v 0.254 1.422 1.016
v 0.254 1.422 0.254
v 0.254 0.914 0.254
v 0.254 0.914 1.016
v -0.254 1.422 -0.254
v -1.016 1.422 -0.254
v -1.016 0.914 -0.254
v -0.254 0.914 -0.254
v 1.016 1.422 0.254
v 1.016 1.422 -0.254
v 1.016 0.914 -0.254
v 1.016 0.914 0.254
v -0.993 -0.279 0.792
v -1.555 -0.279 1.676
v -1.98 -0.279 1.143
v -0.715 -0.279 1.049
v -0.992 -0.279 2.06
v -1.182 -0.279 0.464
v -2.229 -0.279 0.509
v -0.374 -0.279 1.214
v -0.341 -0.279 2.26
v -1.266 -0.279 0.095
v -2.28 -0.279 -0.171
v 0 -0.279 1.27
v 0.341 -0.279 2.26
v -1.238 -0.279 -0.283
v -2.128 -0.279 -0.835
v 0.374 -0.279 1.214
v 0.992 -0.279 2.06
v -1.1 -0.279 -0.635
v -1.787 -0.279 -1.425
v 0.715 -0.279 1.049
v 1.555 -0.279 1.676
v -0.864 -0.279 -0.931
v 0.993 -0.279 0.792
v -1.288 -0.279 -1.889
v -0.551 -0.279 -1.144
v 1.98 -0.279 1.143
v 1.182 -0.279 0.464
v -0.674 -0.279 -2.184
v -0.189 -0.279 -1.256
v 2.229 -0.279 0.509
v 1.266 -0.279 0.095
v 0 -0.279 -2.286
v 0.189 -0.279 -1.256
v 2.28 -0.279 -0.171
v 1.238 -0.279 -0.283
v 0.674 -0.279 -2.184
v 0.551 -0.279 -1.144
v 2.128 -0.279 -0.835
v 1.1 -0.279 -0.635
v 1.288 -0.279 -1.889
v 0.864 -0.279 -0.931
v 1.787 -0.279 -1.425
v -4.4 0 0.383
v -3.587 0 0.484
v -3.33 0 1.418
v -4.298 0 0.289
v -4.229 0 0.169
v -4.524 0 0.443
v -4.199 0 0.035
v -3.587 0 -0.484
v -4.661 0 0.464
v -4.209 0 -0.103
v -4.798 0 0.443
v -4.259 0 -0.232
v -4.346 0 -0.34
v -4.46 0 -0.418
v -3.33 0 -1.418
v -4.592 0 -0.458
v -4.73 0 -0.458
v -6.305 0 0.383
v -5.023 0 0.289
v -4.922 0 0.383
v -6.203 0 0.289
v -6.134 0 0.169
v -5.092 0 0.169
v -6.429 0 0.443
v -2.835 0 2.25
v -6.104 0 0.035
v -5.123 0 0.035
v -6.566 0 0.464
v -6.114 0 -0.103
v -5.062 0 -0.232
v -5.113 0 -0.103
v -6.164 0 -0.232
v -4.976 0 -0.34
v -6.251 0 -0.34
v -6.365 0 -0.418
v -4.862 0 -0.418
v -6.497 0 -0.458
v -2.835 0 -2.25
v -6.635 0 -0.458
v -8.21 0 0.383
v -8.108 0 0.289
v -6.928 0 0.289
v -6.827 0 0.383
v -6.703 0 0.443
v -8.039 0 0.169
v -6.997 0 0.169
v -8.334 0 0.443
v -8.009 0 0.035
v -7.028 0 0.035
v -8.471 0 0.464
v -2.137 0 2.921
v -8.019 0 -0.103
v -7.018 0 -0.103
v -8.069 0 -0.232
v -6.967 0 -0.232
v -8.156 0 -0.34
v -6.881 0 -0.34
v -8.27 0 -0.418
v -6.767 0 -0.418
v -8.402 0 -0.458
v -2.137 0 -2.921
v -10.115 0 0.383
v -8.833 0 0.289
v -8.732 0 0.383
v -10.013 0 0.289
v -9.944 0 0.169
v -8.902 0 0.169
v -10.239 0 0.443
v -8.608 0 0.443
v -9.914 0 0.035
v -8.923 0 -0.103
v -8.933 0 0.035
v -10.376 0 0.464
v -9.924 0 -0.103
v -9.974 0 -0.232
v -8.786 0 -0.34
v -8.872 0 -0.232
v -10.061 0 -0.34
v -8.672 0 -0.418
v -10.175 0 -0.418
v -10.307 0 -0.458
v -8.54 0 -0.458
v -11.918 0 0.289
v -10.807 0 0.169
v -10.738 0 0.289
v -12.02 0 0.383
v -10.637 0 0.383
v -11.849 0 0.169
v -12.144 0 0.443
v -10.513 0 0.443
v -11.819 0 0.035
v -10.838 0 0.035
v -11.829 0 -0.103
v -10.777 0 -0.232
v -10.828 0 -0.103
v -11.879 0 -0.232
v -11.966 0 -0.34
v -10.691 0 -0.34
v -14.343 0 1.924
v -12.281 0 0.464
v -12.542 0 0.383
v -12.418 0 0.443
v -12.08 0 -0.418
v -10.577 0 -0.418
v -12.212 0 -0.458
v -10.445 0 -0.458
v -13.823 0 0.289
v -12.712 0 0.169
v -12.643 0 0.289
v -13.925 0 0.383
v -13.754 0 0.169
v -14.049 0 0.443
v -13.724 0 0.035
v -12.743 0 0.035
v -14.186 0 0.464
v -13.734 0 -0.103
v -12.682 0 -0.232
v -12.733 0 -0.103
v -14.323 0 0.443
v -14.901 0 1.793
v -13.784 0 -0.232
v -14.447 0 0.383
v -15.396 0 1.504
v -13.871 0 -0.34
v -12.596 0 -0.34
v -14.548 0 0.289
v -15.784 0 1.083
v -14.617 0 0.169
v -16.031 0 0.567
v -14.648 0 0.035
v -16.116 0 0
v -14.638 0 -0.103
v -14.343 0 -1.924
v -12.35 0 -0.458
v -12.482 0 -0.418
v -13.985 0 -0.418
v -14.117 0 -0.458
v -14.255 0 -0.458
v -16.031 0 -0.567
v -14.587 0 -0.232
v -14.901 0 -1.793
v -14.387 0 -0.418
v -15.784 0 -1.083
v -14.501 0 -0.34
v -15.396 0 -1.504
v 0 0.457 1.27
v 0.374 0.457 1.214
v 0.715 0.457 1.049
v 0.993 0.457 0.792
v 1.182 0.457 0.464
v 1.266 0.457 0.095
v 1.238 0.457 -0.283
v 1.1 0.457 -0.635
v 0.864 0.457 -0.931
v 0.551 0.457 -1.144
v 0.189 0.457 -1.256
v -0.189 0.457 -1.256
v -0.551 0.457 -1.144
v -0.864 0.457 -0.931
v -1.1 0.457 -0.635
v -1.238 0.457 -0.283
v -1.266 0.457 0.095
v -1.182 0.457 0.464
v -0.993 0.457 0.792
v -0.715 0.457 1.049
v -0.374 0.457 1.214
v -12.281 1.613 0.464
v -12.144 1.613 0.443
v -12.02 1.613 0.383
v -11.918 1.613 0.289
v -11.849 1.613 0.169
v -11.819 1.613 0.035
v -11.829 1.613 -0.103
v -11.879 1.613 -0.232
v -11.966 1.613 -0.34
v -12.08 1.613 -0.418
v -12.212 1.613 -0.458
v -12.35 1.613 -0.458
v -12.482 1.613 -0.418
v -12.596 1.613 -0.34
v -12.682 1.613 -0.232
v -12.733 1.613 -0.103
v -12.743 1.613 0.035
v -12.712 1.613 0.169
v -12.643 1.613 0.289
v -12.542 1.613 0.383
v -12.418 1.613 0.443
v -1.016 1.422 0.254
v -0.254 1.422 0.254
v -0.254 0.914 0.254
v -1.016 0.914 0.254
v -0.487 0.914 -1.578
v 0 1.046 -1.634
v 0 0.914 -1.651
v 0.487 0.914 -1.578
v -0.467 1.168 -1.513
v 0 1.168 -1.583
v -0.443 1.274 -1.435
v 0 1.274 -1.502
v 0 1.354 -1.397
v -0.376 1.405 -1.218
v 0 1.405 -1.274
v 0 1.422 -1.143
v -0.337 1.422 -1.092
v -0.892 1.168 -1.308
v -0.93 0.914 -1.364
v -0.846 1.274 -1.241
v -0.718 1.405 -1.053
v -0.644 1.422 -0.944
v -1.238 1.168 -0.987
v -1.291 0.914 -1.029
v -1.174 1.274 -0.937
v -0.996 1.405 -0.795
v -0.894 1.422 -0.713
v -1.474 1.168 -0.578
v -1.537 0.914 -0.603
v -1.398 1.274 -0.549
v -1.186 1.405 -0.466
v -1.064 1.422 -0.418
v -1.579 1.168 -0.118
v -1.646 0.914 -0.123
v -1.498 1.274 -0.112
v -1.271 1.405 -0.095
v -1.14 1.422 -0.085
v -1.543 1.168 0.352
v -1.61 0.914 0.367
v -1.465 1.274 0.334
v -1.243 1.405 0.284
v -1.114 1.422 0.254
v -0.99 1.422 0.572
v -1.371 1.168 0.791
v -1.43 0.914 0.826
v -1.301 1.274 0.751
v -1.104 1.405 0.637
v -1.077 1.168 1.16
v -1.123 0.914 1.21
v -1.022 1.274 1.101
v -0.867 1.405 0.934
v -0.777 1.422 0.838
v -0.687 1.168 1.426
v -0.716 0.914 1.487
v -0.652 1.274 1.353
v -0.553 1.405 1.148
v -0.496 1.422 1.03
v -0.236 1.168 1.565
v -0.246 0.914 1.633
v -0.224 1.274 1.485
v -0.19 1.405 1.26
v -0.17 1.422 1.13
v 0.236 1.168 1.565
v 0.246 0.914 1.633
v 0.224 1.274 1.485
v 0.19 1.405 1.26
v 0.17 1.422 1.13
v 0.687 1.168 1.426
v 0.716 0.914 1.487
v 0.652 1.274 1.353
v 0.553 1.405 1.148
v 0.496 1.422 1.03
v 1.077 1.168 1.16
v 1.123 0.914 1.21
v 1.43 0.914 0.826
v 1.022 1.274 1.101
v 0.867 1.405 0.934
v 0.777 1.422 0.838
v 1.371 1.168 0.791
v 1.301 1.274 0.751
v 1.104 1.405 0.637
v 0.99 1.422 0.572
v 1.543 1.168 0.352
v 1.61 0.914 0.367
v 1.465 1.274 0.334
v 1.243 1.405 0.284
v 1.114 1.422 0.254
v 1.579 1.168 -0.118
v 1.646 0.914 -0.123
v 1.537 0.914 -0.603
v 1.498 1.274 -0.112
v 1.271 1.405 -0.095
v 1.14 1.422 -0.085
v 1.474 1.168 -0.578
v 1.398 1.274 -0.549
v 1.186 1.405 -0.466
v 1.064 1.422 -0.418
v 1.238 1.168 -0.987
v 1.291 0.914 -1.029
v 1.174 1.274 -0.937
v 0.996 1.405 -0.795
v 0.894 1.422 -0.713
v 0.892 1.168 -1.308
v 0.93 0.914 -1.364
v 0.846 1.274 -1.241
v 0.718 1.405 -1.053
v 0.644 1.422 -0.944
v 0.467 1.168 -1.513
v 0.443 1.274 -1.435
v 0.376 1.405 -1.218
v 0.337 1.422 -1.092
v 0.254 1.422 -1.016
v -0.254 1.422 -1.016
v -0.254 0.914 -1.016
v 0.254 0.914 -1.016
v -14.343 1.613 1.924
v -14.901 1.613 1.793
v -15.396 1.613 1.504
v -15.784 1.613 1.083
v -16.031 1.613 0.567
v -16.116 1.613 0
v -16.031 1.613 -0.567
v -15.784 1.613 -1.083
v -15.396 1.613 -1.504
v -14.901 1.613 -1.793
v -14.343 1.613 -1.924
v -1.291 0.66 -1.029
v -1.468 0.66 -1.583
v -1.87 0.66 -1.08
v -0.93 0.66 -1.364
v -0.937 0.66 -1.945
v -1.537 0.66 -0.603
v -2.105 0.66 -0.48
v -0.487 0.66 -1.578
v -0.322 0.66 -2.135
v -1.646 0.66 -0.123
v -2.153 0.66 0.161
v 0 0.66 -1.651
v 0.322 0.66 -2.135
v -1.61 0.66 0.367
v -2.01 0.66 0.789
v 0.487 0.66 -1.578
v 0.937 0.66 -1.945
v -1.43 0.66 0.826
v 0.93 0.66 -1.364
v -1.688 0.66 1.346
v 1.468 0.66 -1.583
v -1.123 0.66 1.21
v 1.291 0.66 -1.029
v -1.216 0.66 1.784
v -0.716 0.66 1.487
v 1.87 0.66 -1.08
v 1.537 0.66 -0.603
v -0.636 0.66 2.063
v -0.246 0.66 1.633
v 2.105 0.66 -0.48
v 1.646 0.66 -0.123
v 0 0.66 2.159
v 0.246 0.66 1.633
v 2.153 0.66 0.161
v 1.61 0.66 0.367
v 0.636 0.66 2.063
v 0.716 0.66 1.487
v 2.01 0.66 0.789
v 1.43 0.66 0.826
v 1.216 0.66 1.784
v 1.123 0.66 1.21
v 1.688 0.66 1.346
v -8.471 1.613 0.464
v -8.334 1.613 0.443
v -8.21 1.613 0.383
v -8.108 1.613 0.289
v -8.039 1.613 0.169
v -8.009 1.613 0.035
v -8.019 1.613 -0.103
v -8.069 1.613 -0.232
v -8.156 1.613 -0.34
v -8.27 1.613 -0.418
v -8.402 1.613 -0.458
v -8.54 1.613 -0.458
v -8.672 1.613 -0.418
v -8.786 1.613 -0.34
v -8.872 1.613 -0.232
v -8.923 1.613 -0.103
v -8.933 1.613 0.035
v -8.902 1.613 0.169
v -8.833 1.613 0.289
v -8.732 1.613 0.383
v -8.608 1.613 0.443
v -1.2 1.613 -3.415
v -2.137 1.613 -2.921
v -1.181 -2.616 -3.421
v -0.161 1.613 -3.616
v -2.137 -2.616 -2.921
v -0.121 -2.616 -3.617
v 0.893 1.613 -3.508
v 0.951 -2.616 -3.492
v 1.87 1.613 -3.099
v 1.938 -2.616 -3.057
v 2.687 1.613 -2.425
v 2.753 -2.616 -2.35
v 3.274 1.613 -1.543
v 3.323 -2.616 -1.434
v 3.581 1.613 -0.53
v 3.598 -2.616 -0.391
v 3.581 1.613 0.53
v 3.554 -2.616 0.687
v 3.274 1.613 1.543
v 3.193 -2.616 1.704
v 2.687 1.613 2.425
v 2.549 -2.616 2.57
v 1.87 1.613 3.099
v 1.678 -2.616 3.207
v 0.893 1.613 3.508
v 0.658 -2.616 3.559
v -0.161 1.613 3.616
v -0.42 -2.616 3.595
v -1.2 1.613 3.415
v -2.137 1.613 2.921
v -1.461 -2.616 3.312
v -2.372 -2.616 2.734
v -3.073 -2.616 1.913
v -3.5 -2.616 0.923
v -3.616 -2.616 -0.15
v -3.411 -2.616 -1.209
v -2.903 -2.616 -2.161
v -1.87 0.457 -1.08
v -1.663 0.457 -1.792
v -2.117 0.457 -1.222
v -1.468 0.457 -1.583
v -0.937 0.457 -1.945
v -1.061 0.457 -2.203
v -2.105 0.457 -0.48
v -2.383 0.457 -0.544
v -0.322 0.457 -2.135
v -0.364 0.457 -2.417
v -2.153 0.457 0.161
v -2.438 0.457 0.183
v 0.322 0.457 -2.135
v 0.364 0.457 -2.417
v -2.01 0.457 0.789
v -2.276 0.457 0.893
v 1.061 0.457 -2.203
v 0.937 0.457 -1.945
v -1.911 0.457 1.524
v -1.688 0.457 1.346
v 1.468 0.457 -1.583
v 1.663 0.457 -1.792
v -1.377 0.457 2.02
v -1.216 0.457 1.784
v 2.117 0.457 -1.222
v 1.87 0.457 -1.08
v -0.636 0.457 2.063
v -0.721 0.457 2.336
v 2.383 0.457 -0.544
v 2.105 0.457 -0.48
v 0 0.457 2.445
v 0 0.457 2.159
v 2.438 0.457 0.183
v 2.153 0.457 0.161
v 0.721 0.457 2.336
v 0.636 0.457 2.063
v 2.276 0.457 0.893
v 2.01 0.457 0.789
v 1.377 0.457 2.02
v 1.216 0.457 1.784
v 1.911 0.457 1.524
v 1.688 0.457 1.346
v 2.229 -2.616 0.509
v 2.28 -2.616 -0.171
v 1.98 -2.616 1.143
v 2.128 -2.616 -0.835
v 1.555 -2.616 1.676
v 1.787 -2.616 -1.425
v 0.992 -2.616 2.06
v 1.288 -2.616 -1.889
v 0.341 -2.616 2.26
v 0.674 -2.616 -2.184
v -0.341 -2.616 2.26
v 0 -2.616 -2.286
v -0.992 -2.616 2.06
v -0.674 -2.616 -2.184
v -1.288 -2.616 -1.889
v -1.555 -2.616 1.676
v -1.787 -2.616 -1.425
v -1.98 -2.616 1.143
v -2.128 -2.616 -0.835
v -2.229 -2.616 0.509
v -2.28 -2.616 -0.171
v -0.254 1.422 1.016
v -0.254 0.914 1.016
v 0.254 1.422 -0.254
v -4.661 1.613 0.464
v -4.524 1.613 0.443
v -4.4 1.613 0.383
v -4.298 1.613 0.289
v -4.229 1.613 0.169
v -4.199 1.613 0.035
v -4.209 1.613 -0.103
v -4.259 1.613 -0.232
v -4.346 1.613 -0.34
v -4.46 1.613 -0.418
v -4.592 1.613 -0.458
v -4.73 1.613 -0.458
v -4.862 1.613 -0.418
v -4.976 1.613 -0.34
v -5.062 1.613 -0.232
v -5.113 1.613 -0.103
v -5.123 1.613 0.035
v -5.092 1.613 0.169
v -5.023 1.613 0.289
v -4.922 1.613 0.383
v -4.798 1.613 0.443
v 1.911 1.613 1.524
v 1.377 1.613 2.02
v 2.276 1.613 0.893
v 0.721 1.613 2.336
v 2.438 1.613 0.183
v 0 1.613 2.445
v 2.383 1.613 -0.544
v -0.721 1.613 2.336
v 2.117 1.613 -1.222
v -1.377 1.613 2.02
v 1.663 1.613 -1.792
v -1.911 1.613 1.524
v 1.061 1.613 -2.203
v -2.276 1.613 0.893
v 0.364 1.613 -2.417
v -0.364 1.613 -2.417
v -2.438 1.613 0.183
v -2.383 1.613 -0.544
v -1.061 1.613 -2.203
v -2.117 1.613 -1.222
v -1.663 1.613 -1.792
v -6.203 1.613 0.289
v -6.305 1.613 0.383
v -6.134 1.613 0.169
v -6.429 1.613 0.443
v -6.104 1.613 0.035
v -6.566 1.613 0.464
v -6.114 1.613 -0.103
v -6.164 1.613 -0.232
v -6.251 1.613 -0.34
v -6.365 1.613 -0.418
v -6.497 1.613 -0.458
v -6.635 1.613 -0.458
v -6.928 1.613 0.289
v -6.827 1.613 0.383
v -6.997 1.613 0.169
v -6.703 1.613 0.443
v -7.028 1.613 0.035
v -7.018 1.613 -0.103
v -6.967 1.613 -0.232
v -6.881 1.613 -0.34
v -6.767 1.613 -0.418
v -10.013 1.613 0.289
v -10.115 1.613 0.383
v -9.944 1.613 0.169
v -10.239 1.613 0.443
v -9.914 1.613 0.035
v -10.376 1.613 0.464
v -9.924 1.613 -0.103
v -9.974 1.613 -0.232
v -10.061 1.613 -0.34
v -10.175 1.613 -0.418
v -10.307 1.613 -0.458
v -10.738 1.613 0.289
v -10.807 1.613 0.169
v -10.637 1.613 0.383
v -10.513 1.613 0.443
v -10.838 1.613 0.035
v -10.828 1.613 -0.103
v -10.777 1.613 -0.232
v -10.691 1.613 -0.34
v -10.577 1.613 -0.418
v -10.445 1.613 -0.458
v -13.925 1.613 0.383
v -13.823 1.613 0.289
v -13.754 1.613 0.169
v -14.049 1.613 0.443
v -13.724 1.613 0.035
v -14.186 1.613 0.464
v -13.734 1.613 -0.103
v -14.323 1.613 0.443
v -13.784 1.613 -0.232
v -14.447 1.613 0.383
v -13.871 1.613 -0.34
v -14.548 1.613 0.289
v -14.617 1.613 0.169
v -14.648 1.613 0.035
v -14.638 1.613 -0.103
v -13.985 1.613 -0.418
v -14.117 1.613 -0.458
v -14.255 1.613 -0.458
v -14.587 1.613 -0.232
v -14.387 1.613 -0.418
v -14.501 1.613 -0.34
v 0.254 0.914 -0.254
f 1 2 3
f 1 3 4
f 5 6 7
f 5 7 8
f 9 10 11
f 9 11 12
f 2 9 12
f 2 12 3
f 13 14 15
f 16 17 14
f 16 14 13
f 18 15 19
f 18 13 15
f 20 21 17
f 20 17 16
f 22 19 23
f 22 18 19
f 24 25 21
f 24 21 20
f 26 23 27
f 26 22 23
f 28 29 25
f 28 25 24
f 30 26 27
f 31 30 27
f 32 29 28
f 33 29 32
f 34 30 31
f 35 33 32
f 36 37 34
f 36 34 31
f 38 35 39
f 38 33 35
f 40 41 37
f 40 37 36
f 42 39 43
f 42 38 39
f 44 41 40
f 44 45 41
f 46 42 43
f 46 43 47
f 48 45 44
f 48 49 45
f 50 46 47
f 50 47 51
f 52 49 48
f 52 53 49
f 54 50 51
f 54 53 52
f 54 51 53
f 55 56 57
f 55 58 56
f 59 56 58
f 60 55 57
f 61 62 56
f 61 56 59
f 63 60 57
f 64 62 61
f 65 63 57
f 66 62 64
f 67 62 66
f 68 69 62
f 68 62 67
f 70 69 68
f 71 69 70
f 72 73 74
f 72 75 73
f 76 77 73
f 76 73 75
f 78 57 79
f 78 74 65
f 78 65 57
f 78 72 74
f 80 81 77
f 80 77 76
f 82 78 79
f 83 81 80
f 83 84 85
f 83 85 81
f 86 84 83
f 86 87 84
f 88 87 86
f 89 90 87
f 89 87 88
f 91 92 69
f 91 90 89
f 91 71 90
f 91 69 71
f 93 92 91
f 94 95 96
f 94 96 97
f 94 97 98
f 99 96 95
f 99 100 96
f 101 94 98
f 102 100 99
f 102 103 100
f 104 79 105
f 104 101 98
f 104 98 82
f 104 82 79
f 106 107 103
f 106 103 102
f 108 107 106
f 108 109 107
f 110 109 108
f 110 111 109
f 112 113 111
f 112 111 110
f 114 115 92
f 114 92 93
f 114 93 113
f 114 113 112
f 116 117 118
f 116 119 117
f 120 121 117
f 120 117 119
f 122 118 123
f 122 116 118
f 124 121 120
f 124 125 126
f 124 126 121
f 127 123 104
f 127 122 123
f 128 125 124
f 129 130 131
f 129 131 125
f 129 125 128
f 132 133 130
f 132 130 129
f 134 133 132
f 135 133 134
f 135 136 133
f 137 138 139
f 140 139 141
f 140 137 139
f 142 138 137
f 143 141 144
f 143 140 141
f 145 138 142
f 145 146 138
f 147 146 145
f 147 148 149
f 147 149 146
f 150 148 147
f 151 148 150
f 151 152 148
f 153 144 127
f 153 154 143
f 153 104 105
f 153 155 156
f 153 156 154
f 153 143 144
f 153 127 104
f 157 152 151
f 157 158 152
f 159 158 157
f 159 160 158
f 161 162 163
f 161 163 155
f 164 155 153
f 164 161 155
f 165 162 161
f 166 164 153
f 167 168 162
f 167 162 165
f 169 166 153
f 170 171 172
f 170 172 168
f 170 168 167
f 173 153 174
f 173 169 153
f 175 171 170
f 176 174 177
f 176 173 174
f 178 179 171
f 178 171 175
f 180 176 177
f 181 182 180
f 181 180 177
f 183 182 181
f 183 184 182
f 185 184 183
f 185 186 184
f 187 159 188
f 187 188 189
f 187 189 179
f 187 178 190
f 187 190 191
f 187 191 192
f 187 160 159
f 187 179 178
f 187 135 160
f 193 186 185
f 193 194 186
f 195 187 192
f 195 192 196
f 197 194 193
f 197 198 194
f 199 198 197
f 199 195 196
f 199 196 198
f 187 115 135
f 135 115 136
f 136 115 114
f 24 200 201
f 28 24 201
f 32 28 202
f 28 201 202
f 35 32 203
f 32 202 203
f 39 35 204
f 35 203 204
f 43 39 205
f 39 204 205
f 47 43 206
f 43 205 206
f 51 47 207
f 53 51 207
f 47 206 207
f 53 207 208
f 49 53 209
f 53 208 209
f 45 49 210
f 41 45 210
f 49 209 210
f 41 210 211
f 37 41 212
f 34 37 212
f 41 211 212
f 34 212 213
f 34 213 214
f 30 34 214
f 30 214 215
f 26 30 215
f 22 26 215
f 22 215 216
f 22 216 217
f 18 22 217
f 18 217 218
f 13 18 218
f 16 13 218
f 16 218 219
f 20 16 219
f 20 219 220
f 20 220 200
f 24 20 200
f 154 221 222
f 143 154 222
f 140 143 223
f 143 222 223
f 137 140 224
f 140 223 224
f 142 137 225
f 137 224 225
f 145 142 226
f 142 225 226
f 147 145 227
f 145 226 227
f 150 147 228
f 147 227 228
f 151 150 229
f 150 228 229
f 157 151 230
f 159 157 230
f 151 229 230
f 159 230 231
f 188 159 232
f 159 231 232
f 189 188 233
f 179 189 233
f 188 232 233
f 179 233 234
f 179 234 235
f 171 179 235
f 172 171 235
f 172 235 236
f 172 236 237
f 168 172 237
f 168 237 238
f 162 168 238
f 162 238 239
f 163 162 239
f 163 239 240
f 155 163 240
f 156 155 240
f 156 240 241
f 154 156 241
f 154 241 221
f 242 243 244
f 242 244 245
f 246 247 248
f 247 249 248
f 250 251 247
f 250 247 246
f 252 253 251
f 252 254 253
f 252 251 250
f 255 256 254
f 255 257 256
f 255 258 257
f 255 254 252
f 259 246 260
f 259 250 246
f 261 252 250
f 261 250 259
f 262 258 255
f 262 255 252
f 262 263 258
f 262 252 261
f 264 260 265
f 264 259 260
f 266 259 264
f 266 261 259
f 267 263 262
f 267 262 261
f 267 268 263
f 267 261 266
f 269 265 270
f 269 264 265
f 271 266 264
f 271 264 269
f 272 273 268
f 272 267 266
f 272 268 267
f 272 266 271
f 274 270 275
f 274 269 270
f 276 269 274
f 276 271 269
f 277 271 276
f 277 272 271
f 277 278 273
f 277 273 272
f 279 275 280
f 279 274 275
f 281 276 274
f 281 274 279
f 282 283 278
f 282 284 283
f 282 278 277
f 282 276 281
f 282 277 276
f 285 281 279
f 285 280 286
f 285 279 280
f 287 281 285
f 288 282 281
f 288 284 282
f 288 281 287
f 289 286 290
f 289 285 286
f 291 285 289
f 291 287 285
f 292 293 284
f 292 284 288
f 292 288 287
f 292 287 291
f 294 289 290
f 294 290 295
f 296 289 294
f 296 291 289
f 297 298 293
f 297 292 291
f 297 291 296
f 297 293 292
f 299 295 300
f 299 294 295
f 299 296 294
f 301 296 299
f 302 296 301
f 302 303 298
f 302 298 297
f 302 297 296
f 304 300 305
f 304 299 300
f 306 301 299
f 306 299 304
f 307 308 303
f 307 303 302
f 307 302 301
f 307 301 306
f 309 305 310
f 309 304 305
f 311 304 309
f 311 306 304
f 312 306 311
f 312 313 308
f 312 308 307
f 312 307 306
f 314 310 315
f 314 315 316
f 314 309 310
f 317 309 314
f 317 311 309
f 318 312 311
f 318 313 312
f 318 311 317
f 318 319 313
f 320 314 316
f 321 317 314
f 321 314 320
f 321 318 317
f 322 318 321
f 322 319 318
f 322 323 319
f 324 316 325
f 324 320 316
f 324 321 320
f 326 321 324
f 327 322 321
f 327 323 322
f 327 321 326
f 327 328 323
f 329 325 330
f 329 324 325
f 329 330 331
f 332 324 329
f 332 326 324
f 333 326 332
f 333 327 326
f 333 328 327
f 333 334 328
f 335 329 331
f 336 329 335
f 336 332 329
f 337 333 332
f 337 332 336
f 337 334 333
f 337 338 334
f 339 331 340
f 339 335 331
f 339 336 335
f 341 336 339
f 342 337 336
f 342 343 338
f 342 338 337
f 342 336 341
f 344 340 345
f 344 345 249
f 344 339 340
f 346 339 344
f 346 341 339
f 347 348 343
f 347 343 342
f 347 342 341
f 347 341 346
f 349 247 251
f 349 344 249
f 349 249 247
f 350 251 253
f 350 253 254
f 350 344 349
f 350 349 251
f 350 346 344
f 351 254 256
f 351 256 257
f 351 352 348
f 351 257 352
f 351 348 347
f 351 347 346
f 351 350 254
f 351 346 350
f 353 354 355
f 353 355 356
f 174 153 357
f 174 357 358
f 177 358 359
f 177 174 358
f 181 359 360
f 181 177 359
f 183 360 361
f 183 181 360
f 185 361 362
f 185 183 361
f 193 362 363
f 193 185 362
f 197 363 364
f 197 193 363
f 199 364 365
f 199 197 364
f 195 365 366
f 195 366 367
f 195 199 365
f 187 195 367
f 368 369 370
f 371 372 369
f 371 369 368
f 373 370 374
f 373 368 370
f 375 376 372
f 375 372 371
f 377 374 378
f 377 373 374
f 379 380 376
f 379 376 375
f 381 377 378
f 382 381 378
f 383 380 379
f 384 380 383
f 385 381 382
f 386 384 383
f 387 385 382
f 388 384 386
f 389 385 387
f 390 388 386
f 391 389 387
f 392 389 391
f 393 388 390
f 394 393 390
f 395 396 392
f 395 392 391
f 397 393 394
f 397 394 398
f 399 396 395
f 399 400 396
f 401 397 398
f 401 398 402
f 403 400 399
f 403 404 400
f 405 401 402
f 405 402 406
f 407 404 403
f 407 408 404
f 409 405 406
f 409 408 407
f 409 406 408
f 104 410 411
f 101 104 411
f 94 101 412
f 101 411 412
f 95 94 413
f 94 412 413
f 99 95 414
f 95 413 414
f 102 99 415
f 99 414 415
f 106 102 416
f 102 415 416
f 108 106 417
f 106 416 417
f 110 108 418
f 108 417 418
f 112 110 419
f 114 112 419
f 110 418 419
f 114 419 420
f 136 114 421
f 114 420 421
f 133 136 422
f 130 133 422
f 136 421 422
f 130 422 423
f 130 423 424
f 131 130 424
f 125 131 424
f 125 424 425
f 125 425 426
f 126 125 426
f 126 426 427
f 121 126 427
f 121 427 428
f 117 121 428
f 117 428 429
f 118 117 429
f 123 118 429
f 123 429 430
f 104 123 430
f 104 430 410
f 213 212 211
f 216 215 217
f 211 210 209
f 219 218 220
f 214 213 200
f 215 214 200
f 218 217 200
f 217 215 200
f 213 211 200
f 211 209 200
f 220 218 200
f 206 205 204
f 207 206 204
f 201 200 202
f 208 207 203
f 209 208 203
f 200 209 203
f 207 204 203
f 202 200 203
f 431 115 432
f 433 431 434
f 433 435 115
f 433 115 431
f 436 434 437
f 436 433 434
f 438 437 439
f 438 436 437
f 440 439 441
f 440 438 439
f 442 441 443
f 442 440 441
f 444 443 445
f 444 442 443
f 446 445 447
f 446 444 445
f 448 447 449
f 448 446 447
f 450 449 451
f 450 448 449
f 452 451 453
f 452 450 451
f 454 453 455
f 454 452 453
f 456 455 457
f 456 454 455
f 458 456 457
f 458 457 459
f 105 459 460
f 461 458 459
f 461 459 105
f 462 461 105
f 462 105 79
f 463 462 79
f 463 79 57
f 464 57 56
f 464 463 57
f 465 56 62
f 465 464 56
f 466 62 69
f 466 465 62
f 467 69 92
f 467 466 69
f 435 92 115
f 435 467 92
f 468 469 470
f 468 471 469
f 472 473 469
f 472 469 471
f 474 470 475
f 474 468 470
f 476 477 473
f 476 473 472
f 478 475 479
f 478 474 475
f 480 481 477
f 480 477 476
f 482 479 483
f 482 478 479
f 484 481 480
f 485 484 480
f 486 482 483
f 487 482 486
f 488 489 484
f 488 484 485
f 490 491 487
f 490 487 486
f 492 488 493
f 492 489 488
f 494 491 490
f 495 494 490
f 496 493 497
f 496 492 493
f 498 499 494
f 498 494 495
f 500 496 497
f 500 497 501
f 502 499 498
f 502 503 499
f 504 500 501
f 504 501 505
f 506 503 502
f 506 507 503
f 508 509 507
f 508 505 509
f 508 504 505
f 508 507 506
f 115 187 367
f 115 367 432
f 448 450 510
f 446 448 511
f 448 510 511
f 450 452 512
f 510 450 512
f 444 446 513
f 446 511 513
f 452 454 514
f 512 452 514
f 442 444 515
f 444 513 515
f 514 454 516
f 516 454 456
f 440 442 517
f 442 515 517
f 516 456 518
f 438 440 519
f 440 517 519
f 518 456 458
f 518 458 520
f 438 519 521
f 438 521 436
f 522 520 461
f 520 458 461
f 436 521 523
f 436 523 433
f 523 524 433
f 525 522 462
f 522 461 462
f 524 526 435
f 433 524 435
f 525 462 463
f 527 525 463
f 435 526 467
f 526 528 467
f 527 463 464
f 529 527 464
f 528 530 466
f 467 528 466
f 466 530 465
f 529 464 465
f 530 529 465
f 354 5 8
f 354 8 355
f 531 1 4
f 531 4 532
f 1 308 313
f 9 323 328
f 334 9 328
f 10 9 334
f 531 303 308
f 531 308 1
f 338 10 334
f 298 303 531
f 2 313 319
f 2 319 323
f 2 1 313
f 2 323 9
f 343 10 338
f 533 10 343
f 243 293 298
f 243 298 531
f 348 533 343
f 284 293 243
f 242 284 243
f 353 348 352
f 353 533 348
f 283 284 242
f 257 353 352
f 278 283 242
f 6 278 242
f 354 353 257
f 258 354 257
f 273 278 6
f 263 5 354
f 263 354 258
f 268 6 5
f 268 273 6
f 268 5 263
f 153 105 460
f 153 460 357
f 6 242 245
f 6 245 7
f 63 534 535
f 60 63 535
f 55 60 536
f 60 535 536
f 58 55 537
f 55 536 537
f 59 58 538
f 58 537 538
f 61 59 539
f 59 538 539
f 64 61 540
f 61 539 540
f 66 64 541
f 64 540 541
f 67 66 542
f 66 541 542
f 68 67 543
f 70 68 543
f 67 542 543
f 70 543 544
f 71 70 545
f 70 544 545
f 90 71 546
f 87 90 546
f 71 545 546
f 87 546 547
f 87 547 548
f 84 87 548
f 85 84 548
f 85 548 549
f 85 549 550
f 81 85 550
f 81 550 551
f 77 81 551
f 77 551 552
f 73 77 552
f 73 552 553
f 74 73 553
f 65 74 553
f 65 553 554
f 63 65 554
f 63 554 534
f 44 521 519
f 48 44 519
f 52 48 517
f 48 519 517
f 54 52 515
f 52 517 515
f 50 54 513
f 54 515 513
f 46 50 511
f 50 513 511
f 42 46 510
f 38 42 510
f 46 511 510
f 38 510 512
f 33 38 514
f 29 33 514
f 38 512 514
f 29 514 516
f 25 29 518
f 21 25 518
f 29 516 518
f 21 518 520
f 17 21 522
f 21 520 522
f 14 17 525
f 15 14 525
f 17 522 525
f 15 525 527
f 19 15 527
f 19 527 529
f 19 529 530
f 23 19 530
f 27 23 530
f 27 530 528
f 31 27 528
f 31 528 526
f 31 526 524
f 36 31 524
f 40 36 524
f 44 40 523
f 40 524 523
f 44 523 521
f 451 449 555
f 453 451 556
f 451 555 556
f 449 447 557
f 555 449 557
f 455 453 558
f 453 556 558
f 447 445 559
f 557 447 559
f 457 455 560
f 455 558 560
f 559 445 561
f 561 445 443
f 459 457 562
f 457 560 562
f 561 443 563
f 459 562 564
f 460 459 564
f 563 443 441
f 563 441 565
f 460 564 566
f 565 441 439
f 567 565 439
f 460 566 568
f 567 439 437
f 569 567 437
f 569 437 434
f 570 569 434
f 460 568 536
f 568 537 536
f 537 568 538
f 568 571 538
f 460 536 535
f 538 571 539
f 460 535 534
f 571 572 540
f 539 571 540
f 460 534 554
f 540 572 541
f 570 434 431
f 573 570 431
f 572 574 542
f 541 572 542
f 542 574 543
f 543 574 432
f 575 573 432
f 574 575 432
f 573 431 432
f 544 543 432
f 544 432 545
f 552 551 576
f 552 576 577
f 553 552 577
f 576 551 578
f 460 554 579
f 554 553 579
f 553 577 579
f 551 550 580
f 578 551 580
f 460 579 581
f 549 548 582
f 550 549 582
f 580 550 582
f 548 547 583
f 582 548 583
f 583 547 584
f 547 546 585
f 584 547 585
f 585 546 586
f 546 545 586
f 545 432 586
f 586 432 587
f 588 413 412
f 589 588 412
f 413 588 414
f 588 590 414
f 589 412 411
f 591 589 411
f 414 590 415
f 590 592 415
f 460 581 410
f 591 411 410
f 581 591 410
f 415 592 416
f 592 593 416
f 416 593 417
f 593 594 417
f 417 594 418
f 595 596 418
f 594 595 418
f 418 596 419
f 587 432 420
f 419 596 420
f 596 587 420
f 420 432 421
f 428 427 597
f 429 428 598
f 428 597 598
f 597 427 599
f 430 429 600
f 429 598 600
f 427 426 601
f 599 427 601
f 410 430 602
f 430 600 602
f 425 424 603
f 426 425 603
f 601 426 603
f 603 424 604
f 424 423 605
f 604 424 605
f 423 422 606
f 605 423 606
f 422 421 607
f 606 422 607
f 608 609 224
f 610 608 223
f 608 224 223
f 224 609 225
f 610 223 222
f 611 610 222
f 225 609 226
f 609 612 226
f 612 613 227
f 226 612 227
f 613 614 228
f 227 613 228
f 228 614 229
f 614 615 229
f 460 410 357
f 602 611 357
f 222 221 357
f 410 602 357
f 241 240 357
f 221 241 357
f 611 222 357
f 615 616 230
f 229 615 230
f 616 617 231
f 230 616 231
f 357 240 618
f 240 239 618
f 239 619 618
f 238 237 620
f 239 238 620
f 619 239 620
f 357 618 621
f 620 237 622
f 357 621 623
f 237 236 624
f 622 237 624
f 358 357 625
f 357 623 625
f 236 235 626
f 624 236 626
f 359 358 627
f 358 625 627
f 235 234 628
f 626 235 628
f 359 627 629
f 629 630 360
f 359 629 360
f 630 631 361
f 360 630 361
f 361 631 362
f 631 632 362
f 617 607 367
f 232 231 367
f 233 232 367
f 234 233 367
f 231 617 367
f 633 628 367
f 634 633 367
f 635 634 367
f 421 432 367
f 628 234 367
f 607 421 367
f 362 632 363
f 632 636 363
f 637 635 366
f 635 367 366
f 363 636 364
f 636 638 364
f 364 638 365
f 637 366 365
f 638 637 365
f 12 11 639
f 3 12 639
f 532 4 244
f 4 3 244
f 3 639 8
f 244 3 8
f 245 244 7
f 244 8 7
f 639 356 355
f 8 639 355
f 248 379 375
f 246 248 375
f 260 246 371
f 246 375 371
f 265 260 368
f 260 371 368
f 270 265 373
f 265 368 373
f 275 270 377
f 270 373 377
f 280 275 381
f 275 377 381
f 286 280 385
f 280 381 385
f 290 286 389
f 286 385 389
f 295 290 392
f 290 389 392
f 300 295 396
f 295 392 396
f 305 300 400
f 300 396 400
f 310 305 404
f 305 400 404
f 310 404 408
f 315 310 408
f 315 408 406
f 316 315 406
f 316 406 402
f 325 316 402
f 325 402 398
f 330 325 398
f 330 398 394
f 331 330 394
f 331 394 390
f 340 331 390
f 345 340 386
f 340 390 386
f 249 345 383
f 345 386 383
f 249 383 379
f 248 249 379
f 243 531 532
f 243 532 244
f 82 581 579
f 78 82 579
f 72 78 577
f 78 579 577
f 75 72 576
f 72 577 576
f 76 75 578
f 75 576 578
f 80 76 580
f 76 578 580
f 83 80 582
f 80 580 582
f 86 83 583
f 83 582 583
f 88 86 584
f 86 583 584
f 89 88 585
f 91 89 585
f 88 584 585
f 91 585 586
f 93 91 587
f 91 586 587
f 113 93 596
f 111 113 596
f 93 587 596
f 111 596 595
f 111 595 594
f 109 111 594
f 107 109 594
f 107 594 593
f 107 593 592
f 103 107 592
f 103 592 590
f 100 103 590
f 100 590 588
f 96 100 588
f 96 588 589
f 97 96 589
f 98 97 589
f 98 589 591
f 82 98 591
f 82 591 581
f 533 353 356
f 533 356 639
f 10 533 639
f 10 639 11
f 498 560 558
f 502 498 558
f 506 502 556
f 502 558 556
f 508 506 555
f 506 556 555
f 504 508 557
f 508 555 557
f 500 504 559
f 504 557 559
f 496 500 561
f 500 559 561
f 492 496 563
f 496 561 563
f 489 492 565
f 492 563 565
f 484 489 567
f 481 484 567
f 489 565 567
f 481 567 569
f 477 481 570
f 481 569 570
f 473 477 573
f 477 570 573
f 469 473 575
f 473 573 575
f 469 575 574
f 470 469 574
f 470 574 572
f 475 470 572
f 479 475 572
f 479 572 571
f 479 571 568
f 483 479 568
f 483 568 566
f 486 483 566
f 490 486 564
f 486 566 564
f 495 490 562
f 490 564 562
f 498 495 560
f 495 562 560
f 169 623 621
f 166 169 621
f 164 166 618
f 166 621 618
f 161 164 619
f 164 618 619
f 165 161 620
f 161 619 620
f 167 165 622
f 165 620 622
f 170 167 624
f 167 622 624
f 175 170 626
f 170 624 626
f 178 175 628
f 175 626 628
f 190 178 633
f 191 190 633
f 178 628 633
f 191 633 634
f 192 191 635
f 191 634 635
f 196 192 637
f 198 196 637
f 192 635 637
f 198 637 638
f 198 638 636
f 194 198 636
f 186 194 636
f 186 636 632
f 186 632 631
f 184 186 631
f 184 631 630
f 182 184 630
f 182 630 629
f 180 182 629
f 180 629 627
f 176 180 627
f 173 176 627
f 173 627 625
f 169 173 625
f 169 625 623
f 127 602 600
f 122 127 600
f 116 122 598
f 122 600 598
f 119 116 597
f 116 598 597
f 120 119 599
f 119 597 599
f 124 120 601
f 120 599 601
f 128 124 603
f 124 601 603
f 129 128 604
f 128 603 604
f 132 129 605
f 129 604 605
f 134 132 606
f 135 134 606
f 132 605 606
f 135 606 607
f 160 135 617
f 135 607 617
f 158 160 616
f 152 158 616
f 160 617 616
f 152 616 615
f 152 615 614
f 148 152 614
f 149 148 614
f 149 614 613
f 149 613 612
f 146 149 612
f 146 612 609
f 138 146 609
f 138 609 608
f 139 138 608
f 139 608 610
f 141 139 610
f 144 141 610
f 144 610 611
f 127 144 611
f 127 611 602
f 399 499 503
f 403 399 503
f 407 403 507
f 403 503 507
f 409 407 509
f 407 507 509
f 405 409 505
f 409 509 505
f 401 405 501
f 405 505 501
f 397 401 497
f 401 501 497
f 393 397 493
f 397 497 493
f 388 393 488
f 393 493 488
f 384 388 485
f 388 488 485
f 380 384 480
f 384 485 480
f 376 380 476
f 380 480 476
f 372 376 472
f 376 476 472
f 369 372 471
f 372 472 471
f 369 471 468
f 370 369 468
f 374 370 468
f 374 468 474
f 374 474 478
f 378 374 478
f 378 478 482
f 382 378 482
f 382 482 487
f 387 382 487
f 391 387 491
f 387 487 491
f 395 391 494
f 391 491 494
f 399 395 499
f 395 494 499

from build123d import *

# Parameters (mm, degrees)
EXTRUDE17_DEPTH = 1.6129
SKETCH19_R      = 3.6195
EXTRUDE19_DEPTH = 4.2291
SKETCH20_R      = 0.46355
SKETCH20_R_2    = 1.27
EXTRUDE20_DEPTH = 18.050548166
SKETCH21_R      = 2.44475
EXTRUDE21_DEPTH = 1.1557
SKETCH22_R      = 2.286
EXTRUDE22_DEPTH = 2.3368
SKETCH23_R      = 2.159
EXTRUDE23_DEPTH = 0.2032
SKETCH24_R      = 1.651
EXTRUDE24_DEPTH = 0.762
EXTRUDE25_DEPTH = 0.508
FILLET1_R       = 0.508


with BuildPart() as part:
    # Sketch18 → Extrude17 (new body)
    with BuildSketch(Plane(origin=(0, 0, 0), x_dir=(1, 0, 0), z_dir=(0, 1, 0))):
        with BuildLine():
            Line((-14.34305969, 1.923991942), (-2.13741415, 2.921))
            ThreePointArc((-2.13741415, 2.921), (3.6195, 0), (-2.13741415, -2.921))
            Line((-2.13741415, -2.921), (-14.34305969, -1.923991942))
            ThreePointArc((-14.34305969, -1.923991942), (-16.1163, 0), (-14.34305969, 1.923991942))
        make_face()
    extrude(amount=EXTRUDE17_DEPTH)

    # Sketch19 → Extrude19 (add)
    with BuildSketch(Plane(origin=(0, 1.6129, 0), x_dir=(1, 0, 0), z_dir=(0, 1, 0))):
        with Locations(Location((0, 0, 0), (0, 0, 126.194447475))):
            Circle(SKETCH19_R)
    extrude(amount=-EXTRUDE19_DEPTH)

    # Sketch20 → Extrude20 (cut, through all)
    with BuildSketch(Plane(origin=(0, 1.6129, 0), x_dir=(1, 0, 0), z_dir=(0, 1, 0))):
        with Locations(Location((-14.1859, 0, 0), (0, 0, 270))):
            Circle(SKETCH20_R)
        with Locations(Location((0, 0, 0), (0, 0, 270))):
            Circle(SKETCH20_R_2)
        with Locations(Location((-4.6609, 0, 0), (0, 0, 270))):
            Circle(SKETCH20_R)
        with Locations(Location((-6.5659, 0, 0), (0, 0, 270))):
            Circle(SKETCH20_R)
        with Locations(Location((-8.4709, 0, 0), (0, 0, 270))):
            Circle(SKETCH20_R)
        with Locations(Location((-10.3759, 0, 0), (0, 0, 270))):
            Circle(SKETCH20_R)
        with Locations(Location((-12.2809, 0, 0), (0, 0, 270))):
            Circle(SKETCH20_R)
    extrude(amount=-EXTRUDE20_DEPTH, mode=Mode.SUBTRACT)

    # Sketch21 → Extrude21 (cut)
    with BuildSketch(Plane(origin=(0, 1.6129, 0), x_dir=(1, 0, 0), z_dir=(0, 1, 0))):
        with Locations(Location((0, 0, 0), (0, 0, 270))):
            Circle(SKETCH21_R)
    extrude(amount=-EXTRUDE21_DEPTH, mode=Mode.SUBTRACT)

    # Sketch22 → Extrude22 (cut)
    with BuildSketch(Plane.XZ.offset(2.6162)):
        with Locations(Location((0, 0, 0), (0, 0, 270))):
            Circle(SKETCH22_R)
    extrude(amount=-EXTRUDE22_DEPTH, mode=Mode.SUBTRACT)



with BuildPart() as body_2:
    # Sketch23 → Extrude23 (new body)
    with BuildSketch(Plane(origin=(0, 0.4572, 0), x_dir=(1, 0, 0), z_dir=(0, 1, 0))):
        with Locations(Location((0, 0, 0), (0, 0, 270))):
            Circle(SKETCH23_R)
    extrude(amount=EXTRUDE23_DEPTH)


with BuildPart() as part_1:
    add(part.part)

    add(body_2.part)  # Extrude24 merges body 2
    # Sketch24 → Extrude24 (add)
    with BuildSketch(Plane(origin=(0, 0.6604, 0), x_dir=(1, 0, 0), z_dir=(0, 1, 0))):
        with Locations(Location((0, 0, 0), (0, 0, 90))):
            Circle(SKETCH24_R)
    extrude(amount=EXTRUDE24_DEPTH)

    # Sketch25 → Extrude25 (cut)
    with BuildSketch(Plane(origin=(0, 1.4224, 0), x_dir=(1, 0, 0), z_dir=(0, 1, 0))):
        Polygon((0.254, -1.016), (-0.254, -1.016), (-0.254, -0.254), (-1.016, -0.254), (-1.016, 0.254), (-0.254, 0.254), (-0.254, 1.016), (0.254, 1.016), (0.254, 0.254), (1.016, 0.254), (1.016, -0.254), (0.254, -0.254), align=None)
    extrude(amount=-EXTRUDE25_DEPTH, mode=Mode.SUBTRACT)

    # Fillet1
    fillet1_edges = [part_1.edges().sort_by_distance(p)[0] for p in [
        (0, 1.4224, 1.651),
    ]]
    fillet(fillet1_edges, radius=FILLET1_R)


solid = part_1.part
